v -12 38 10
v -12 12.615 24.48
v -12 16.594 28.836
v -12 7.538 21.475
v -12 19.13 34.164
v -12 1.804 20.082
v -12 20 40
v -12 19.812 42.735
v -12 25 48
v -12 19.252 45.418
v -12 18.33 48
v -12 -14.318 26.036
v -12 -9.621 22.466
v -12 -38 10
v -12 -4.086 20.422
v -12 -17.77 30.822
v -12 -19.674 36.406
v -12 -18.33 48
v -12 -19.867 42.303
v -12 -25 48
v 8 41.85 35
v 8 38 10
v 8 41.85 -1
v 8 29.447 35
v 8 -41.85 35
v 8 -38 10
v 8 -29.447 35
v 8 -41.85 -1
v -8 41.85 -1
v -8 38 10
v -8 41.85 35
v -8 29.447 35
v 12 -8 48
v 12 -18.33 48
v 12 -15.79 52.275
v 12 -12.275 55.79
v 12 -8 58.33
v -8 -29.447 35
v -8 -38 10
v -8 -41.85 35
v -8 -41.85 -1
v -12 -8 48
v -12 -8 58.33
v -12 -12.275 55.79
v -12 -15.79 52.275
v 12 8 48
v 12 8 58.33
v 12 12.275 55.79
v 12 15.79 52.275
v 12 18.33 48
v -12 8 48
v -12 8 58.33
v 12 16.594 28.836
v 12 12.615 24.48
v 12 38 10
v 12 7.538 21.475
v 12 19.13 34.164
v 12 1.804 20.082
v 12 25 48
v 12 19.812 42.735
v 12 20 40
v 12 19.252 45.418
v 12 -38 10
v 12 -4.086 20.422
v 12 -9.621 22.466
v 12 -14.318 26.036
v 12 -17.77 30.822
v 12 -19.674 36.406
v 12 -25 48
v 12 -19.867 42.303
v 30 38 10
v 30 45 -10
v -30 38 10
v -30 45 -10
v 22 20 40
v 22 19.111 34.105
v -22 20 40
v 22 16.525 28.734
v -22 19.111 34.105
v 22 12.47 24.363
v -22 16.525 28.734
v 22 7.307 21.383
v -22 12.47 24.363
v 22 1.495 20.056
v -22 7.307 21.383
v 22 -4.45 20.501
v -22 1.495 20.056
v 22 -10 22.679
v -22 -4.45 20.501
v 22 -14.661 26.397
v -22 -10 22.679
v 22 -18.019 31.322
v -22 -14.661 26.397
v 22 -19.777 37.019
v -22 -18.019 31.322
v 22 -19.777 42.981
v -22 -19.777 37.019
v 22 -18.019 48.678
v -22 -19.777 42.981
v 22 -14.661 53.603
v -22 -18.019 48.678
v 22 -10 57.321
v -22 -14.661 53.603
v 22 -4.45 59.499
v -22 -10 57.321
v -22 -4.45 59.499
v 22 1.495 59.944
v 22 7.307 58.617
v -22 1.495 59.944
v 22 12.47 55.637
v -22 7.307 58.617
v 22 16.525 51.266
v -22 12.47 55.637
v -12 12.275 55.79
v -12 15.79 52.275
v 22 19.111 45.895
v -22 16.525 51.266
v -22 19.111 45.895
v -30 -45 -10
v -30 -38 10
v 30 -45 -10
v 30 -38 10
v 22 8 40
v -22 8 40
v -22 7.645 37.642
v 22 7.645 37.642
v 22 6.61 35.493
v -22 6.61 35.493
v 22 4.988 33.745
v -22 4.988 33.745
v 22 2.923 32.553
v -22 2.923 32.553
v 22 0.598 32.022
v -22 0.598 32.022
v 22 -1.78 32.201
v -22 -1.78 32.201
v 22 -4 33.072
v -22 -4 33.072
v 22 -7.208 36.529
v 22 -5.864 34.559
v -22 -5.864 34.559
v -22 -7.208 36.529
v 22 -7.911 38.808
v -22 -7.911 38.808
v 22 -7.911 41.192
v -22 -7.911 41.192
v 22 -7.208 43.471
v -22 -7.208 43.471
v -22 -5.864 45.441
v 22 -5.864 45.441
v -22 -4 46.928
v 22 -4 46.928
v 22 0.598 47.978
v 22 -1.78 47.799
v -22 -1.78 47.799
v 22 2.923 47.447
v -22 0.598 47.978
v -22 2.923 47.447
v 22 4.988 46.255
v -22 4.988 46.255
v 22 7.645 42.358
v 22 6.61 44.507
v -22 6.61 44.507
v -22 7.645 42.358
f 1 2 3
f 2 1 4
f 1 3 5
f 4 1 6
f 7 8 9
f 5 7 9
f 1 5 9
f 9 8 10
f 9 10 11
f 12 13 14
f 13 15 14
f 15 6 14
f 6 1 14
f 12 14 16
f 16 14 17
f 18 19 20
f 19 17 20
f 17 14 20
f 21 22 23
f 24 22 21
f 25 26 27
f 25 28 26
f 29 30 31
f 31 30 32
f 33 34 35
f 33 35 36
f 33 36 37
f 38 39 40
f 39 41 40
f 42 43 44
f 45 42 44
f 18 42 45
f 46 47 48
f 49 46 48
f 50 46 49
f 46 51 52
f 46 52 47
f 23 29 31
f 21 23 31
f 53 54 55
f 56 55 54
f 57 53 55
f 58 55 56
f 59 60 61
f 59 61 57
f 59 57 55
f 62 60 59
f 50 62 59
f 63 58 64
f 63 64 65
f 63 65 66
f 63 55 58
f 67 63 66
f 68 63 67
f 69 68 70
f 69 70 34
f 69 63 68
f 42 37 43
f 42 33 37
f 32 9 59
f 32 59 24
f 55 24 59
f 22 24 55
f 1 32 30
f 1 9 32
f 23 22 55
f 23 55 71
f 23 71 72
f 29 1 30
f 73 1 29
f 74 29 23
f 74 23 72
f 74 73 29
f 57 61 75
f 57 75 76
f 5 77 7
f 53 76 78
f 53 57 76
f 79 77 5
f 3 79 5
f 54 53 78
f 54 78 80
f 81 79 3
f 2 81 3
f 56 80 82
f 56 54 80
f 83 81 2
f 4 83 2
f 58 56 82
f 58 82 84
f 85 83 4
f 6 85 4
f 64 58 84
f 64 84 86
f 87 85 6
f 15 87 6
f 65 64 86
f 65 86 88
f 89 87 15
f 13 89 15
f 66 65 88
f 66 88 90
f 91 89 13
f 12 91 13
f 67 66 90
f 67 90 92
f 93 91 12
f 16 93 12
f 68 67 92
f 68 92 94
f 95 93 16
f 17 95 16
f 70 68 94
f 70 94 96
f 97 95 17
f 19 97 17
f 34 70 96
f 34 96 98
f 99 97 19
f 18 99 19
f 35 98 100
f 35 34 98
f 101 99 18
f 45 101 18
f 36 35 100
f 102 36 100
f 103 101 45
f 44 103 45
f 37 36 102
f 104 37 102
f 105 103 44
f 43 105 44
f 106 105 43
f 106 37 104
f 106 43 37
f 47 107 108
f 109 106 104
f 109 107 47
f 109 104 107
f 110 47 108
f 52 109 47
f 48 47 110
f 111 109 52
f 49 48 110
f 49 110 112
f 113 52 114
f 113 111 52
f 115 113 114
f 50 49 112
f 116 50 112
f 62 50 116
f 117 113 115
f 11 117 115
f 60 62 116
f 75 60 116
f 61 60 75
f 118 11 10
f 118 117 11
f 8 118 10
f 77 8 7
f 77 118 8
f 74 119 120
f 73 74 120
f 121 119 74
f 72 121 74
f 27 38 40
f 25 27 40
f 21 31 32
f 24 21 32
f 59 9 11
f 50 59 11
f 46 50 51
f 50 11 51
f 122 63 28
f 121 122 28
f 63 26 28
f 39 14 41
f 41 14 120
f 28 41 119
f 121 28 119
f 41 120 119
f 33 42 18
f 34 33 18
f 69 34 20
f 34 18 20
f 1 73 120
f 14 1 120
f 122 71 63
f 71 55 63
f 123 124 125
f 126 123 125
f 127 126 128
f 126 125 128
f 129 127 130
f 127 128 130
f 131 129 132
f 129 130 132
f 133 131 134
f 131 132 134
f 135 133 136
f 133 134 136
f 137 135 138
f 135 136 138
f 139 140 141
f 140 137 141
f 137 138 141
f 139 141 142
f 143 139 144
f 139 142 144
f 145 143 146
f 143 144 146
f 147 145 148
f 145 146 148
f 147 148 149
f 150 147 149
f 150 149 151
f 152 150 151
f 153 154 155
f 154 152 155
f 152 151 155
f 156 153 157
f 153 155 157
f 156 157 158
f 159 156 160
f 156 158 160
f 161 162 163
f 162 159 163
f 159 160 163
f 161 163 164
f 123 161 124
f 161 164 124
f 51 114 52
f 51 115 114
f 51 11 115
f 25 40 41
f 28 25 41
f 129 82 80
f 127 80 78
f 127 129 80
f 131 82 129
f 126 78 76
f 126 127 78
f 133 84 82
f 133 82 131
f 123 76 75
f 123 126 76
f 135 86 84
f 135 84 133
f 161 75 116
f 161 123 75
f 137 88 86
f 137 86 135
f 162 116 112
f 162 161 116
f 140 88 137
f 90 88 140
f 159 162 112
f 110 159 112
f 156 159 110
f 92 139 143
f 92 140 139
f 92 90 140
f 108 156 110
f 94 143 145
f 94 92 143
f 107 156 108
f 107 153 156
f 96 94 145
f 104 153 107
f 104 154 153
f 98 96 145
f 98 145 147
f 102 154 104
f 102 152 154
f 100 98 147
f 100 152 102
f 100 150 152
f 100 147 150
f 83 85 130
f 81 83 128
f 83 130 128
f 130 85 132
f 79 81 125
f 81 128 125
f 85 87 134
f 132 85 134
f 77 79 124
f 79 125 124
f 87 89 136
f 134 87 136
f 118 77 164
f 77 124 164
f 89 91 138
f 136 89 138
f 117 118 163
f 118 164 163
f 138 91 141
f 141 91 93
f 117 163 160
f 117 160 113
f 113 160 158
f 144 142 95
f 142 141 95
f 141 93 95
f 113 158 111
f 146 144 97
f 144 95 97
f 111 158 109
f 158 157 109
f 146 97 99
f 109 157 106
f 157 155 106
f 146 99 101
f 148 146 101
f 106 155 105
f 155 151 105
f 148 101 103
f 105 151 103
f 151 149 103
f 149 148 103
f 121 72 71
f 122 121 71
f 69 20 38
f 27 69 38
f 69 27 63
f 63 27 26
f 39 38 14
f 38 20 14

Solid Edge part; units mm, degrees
sketch "Sketch1" plane through (0, 0, 0) normal (1, 0, 0) x (0, 1, 0)
  line L0 (-38, 10) -> (-45, -10)
  line L1 (-45, -10) -> (45, -10)
  line L2 (38, 10) -> (45, -10)
  line L3 (38, 10) -> (-38, 10)
extrude "Protrusion1" add sketch "Sketch1" along normal mid plane 60
sketch "Sketch2" plane through (0, 0, 0) normal (1, 0, 0) x (0, 1, 0)
  line L0 (-25, 48) -> (-38, 10)
  line L1 (-38, 10) -> (38, 10)
  line L2 (25, 48) -> (38, 10)
  line L3 (25, 48) -> (-25, 48)
extrude "ExtrudedProtrusion_2" add sketch "Sketch2" along normal mid plane 24
sketch "Sketch3" plane through (0, 0, 0) normal (1, 0, 0) x (0, 1, 0)
  circle A0 centre (0, 40) radius 20
extrude "ExtrudedProtrusion_3" add sketch "Sketch3" along normal mid plane 44
sketch "Sketch4" plane through (0, 0, 0) normal (1, 0, 0) x (0, 1, 0)
  line L0 (-41.85, 35) -> (-41.85, -1)
  line L1 (-41.85, -1) -> (41.85, -1)
  line L2 (41.85, -1) -> (41.85, 35)
  line L3 (41.85, 35) -> (-41.85, 35)
extrude "ExtrudedProtrusion_4" add sketch "Sketch4" along normal mid plane 16
sketch "Sketch5" plane through (0, 0, 0) normal (1, 0, 0) x (0, 1, 0)
  circle A0 centre (0, 40) radius 8
extrude "ExtrudedCutout_1" cut sketch "Sketch5" along normal mid plane 44
sketch "Sketch6" plane through (0, -21.6652, 48) normal (0, 0, 1) x (1, 0, 0)
  line L0 (-12, 13.6652) -> (-12, -3.3348)
  line L1 (-12, -3.3348) -> (12, -3.3348)
  line L2 (12, -3.3348) -> (12, 13.6652)
  line L3 (12, 13.6652) -> (-12, 13.6652)
extrude "ExtrudedCutout_2" cut sketch "Sketch6" along normal blind 20.2451
mirror "Mirror1" about plane through (0, 0, 0) normal (0, -1, 0) of "ExtrudedCutout_2"
